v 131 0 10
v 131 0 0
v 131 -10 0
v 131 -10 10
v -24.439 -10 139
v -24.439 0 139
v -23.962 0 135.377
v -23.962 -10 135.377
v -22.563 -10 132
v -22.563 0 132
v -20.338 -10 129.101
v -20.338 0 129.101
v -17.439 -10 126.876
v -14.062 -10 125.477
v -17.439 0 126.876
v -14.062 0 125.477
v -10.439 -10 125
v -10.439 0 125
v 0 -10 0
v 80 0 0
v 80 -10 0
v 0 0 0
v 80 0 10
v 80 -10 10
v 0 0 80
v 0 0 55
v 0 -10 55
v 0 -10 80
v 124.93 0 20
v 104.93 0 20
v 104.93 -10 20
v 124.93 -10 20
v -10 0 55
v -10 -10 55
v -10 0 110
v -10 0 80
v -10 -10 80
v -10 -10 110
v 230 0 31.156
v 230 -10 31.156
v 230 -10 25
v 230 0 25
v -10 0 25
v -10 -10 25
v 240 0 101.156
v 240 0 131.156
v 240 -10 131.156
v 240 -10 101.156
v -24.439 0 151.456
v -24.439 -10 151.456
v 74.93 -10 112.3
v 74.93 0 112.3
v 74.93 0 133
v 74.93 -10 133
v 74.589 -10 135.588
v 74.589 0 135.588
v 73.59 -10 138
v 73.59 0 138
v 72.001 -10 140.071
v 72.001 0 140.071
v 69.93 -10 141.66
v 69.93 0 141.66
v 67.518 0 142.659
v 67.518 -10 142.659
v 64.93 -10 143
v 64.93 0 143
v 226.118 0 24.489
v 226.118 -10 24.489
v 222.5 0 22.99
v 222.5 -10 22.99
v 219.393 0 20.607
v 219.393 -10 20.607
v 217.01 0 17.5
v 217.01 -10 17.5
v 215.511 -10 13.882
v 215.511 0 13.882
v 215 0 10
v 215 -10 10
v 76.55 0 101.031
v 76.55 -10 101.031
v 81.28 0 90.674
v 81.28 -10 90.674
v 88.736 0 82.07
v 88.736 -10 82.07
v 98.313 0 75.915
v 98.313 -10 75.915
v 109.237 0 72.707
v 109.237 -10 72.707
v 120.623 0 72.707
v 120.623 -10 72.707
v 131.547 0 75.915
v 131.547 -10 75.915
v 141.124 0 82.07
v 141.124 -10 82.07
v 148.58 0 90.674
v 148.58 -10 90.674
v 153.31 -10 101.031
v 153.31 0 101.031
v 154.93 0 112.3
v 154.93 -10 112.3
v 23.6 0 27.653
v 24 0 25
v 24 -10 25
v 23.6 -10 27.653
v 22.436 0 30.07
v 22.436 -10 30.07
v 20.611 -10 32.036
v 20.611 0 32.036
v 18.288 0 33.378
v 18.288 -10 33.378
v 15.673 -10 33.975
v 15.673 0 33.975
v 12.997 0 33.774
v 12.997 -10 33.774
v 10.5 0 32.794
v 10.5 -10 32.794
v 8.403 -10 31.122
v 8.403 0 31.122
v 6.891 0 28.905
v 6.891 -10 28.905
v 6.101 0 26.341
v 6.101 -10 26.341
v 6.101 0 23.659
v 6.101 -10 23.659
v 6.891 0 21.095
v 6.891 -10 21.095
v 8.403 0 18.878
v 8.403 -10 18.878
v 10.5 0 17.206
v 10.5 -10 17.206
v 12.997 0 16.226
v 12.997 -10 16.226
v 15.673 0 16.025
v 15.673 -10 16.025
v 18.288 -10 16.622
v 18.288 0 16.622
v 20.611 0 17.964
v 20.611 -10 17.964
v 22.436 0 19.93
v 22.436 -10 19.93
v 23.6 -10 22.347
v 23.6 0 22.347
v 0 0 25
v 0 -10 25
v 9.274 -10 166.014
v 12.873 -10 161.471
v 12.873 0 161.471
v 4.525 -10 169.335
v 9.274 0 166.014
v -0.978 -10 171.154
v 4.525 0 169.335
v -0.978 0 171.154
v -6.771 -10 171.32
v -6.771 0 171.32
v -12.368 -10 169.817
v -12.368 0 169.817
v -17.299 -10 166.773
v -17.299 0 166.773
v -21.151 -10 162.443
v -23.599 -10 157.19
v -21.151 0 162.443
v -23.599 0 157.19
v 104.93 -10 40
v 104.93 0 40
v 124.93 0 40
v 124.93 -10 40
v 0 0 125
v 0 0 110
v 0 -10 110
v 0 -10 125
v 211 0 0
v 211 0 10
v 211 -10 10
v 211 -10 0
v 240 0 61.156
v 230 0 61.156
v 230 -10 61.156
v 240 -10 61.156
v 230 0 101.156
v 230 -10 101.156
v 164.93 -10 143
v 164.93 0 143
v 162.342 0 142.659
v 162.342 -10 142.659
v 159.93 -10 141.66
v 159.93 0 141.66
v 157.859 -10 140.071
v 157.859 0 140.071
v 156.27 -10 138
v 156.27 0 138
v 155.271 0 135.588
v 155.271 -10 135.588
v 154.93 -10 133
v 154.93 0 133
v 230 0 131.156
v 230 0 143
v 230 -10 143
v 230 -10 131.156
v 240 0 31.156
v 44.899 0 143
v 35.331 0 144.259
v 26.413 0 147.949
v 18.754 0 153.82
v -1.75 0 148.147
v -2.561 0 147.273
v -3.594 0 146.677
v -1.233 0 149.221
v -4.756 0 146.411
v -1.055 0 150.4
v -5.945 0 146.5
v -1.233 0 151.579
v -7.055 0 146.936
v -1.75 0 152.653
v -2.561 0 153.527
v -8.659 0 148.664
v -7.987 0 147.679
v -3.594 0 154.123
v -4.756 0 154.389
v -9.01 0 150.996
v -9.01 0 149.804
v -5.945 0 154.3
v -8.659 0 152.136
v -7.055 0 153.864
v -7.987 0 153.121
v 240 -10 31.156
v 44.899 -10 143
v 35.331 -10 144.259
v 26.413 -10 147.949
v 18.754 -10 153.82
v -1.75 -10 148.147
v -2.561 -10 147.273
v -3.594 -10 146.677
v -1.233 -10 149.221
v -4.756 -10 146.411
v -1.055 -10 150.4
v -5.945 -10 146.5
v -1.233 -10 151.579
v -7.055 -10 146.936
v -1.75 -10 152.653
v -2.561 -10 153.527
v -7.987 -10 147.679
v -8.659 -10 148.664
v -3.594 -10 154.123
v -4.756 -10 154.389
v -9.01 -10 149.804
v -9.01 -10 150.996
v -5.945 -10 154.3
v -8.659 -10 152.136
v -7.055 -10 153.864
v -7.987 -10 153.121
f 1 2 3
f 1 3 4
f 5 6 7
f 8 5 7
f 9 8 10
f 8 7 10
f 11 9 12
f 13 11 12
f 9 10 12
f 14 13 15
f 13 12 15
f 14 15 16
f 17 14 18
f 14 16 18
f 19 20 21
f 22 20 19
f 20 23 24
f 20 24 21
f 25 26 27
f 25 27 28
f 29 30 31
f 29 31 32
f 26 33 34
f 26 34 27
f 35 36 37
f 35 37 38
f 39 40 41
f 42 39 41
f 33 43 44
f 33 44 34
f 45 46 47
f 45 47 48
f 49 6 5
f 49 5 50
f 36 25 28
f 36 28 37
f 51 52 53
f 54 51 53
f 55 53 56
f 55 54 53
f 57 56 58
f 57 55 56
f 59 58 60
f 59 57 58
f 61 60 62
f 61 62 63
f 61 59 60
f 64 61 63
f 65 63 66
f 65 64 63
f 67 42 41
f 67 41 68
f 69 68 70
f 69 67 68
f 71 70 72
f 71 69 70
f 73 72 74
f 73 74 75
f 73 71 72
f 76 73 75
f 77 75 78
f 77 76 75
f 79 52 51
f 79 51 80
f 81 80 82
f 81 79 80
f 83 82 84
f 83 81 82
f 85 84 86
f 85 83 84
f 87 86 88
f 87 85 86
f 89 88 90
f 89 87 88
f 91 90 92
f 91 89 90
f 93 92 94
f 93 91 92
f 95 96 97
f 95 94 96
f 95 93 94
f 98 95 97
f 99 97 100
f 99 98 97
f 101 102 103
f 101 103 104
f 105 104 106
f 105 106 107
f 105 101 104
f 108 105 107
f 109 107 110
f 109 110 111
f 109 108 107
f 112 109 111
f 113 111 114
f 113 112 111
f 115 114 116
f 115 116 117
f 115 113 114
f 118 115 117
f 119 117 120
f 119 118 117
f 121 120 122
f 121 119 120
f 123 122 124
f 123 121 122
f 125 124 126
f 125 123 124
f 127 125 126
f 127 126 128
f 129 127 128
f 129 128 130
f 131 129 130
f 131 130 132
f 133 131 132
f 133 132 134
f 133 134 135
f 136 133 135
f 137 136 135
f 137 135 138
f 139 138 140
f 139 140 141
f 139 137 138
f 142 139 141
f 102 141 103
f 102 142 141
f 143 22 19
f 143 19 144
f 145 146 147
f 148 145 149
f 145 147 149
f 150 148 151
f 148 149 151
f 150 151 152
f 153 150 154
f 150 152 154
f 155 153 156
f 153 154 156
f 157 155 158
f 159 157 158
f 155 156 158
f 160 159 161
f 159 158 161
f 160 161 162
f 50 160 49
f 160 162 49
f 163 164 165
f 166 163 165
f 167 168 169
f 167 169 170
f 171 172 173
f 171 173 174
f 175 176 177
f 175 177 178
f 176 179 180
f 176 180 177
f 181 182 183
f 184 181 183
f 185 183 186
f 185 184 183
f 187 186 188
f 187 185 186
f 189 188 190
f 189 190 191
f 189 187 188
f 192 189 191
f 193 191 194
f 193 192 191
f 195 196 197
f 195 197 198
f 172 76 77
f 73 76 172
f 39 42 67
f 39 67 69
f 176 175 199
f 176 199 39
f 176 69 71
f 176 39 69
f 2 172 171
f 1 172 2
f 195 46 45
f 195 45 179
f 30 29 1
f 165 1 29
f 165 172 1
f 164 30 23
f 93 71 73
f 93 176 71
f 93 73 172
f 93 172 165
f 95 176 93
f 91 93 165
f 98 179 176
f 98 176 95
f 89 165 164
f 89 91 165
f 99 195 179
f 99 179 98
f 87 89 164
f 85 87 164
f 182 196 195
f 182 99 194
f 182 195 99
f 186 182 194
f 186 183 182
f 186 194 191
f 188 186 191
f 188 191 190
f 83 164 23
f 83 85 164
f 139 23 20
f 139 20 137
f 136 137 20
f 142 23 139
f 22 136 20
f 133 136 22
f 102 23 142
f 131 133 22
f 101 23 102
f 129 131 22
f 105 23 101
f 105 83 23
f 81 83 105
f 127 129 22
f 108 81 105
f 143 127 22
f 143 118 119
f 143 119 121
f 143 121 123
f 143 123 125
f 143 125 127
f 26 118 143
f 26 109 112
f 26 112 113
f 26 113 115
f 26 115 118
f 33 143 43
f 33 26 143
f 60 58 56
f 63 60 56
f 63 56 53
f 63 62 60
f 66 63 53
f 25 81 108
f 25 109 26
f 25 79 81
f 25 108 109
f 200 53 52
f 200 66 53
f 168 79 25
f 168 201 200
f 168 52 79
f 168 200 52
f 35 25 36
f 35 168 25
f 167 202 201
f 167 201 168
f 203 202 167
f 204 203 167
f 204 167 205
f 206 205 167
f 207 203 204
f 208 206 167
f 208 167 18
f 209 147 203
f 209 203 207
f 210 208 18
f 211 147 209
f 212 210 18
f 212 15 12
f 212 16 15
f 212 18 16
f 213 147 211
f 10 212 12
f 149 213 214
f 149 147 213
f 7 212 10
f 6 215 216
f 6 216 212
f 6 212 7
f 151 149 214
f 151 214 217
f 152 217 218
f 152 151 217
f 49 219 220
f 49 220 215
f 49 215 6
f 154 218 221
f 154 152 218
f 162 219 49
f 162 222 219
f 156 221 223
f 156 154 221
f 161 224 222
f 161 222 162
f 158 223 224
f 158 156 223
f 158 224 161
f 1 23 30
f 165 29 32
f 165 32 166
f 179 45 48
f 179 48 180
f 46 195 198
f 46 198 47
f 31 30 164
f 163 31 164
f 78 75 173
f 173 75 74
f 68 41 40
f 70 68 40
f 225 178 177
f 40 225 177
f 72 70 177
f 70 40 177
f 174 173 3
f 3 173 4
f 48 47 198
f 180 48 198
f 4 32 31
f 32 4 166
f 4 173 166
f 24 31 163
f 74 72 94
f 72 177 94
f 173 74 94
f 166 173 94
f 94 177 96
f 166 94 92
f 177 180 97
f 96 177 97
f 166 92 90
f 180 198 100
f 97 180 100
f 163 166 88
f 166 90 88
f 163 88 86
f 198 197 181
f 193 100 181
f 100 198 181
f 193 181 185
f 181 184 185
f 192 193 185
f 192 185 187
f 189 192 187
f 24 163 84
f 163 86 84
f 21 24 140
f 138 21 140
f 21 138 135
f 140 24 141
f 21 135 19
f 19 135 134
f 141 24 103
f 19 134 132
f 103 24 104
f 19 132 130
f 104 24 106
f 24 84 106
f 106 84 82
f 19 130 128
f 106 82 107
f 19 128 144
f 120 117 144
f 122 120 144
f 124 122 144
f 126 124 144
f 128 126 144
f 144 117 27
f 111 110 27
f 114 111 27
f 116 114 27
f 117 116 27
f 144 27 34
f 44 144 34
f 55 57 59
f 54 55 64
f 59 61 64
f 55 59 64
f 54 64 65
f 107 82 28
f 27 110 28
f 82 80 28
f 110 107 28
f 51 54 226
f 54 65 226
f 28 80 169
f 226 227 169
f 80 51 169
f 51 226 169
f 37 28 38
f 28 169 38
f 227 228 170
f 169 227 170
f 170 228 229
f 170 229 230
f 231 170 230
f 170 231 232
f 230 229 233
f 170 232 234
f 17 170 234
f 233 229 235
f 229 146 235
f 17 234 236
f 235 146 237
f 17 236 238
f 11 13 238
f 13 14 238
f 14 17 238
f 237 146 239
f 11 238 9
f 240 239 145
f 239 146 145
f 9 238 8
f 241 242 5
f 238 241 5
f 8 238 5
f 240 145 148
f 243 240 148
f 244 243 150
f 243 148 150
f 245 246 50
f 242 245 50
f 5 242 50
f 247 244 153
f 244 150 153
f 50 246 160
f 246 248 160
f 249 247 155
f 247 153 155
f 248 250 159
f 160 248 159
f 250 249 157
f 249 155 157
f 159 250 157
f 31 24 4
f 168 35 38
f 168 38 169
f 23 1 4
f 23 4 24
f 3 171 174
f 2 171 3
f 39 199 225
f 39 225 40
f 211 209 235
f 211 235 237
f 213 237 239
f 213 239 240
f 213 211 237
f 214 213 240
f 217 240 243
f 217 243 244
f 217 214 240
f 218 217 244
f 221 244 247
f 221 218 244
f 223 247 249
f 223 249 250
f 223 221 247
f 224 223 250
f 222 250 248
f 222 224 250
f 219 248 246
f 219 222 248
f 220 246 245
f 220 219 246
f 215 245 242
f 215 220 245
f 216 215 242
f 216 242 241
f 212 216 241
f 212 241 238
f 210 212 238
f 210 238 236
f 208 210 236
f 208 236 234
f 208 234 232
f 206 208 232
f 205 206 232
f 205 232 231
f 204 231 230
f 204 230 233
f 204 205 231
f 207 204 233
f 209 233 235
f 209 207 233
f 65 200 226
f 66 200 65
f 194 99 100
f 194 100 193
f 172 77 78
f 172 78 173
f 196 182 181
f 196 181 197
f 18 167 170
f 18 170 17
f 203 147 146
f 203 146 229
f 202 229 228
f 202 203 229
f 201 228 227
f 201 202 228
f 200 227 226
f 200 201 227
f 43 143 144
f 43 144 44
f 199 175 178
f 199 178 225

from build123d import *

# Parameters (mm, degrees)
SKETCH_R        = 9
SKETCH_R_2      = 4
PAD_DEPTH       = 10
COPYSKETCH001_W = 20
COPYSKETCH001_H = 20
POCKET_DEPTH    = 10.001
FILLET_R        = 10


with BuildPart() as part:
    # Sketch → Pad (new body)
    with BuildSketch(Plane.XZ):
        with BuildLine():
            Line((0, 0), (0, 25))
            Line((0, 25), (-10, 25))
            Line((-10, 25), (-10, 55))
            Line((-10, 55), (0, 55))
            Line((0, 55), (0, 80))
            Line((0, 80), (-10, 80))
            Line((-10, 80), (-10, 110))
            Line((-10, 110), (0, 110))
            Line((0, 110), (0, 125))
            Line((0, 125), (-10.439, 125))
            ThreePointArc((-24.439, 139), (-20.338495, 129.100505), (-10.439, 125))
            Line((-24.439, 139), (-24.439, 151.456))
            ThreePointArc((12.872585, 161.471439), (-9.623992, 170.772207), (-24.439, 151.456))
            ThreePointArc((12.872585, 161.471439), (26.413305, 147.948816), (44.899018, 143))
            Line((44.899018, 143), (230, 143))
            Line((230, 143), (230, 131.156))
            Line((230, 131.156), (240, 131.156))
            Line((240, 131.156), (240, 101.156))
            Line((240, 101.156), (230, 101.156))
            Line((230, 101.156), (230, 61.156))
            Line((230, 61.156), (240, 61.156))
            Line((240, 61.156), (240, 31.156))
            Line((240, 31.156), (230, 31.156))
            Line((230, 31.156), (230, 25))
            ThreePointArc((230, 25), (219.393398, 20.606602), (215, 10))
            Line((215, 10), (211, 10))
            Line((211, 10), (211, 0))
            Line((211, 0), (131, 0))
            Line((131, 0), (131, 10))
            Line((131, 10), (80, 10))
            Line((80, 10), (80, 0))
            Line((80, 0), (0, 0))
        make_face()
        with Locations((15, 25)):
            Circle(SKETCH_R, mode=Mode.SUBTRACT)
        with Locations((-5.055, 150.4)):
            Circle(SKETCH_R_2, mode=Mode.SUBTRACT)
    extrude(amount=PAD_DEPTH)

    # CopySketch001 → Pocket (cut, through all)
    with BuildSketch(Plane.XZ):
        with BuildLine():
            ThreePointArc((74.93, 112.3), (114.93, 72.3), (154.93, 112.3))
            Line((154.93, 112.3), (154.93, 155.12))
            Line((74.93, 155.12), (154.93, 155.12))
            Line((74.93, 112.3), (74.93, 155.12))
        make_face()
        with Locations((114.93, 30)):
            Rectangle(COPYSKETCH001_W, COPYSKETCH001_H)
    extrude(amount=POCKET_DEPTH, mode=Mode.SUBTRACT)

    # Fillet
    fillet_edges = [part.edges().sort_by_distance(p)[0] for p in [
        (154.93, -5, 143),
        (74.93, -5, 143),
    ]]
    fillet(fillet_edges, radius=FILLET_R)


solid = part.part
